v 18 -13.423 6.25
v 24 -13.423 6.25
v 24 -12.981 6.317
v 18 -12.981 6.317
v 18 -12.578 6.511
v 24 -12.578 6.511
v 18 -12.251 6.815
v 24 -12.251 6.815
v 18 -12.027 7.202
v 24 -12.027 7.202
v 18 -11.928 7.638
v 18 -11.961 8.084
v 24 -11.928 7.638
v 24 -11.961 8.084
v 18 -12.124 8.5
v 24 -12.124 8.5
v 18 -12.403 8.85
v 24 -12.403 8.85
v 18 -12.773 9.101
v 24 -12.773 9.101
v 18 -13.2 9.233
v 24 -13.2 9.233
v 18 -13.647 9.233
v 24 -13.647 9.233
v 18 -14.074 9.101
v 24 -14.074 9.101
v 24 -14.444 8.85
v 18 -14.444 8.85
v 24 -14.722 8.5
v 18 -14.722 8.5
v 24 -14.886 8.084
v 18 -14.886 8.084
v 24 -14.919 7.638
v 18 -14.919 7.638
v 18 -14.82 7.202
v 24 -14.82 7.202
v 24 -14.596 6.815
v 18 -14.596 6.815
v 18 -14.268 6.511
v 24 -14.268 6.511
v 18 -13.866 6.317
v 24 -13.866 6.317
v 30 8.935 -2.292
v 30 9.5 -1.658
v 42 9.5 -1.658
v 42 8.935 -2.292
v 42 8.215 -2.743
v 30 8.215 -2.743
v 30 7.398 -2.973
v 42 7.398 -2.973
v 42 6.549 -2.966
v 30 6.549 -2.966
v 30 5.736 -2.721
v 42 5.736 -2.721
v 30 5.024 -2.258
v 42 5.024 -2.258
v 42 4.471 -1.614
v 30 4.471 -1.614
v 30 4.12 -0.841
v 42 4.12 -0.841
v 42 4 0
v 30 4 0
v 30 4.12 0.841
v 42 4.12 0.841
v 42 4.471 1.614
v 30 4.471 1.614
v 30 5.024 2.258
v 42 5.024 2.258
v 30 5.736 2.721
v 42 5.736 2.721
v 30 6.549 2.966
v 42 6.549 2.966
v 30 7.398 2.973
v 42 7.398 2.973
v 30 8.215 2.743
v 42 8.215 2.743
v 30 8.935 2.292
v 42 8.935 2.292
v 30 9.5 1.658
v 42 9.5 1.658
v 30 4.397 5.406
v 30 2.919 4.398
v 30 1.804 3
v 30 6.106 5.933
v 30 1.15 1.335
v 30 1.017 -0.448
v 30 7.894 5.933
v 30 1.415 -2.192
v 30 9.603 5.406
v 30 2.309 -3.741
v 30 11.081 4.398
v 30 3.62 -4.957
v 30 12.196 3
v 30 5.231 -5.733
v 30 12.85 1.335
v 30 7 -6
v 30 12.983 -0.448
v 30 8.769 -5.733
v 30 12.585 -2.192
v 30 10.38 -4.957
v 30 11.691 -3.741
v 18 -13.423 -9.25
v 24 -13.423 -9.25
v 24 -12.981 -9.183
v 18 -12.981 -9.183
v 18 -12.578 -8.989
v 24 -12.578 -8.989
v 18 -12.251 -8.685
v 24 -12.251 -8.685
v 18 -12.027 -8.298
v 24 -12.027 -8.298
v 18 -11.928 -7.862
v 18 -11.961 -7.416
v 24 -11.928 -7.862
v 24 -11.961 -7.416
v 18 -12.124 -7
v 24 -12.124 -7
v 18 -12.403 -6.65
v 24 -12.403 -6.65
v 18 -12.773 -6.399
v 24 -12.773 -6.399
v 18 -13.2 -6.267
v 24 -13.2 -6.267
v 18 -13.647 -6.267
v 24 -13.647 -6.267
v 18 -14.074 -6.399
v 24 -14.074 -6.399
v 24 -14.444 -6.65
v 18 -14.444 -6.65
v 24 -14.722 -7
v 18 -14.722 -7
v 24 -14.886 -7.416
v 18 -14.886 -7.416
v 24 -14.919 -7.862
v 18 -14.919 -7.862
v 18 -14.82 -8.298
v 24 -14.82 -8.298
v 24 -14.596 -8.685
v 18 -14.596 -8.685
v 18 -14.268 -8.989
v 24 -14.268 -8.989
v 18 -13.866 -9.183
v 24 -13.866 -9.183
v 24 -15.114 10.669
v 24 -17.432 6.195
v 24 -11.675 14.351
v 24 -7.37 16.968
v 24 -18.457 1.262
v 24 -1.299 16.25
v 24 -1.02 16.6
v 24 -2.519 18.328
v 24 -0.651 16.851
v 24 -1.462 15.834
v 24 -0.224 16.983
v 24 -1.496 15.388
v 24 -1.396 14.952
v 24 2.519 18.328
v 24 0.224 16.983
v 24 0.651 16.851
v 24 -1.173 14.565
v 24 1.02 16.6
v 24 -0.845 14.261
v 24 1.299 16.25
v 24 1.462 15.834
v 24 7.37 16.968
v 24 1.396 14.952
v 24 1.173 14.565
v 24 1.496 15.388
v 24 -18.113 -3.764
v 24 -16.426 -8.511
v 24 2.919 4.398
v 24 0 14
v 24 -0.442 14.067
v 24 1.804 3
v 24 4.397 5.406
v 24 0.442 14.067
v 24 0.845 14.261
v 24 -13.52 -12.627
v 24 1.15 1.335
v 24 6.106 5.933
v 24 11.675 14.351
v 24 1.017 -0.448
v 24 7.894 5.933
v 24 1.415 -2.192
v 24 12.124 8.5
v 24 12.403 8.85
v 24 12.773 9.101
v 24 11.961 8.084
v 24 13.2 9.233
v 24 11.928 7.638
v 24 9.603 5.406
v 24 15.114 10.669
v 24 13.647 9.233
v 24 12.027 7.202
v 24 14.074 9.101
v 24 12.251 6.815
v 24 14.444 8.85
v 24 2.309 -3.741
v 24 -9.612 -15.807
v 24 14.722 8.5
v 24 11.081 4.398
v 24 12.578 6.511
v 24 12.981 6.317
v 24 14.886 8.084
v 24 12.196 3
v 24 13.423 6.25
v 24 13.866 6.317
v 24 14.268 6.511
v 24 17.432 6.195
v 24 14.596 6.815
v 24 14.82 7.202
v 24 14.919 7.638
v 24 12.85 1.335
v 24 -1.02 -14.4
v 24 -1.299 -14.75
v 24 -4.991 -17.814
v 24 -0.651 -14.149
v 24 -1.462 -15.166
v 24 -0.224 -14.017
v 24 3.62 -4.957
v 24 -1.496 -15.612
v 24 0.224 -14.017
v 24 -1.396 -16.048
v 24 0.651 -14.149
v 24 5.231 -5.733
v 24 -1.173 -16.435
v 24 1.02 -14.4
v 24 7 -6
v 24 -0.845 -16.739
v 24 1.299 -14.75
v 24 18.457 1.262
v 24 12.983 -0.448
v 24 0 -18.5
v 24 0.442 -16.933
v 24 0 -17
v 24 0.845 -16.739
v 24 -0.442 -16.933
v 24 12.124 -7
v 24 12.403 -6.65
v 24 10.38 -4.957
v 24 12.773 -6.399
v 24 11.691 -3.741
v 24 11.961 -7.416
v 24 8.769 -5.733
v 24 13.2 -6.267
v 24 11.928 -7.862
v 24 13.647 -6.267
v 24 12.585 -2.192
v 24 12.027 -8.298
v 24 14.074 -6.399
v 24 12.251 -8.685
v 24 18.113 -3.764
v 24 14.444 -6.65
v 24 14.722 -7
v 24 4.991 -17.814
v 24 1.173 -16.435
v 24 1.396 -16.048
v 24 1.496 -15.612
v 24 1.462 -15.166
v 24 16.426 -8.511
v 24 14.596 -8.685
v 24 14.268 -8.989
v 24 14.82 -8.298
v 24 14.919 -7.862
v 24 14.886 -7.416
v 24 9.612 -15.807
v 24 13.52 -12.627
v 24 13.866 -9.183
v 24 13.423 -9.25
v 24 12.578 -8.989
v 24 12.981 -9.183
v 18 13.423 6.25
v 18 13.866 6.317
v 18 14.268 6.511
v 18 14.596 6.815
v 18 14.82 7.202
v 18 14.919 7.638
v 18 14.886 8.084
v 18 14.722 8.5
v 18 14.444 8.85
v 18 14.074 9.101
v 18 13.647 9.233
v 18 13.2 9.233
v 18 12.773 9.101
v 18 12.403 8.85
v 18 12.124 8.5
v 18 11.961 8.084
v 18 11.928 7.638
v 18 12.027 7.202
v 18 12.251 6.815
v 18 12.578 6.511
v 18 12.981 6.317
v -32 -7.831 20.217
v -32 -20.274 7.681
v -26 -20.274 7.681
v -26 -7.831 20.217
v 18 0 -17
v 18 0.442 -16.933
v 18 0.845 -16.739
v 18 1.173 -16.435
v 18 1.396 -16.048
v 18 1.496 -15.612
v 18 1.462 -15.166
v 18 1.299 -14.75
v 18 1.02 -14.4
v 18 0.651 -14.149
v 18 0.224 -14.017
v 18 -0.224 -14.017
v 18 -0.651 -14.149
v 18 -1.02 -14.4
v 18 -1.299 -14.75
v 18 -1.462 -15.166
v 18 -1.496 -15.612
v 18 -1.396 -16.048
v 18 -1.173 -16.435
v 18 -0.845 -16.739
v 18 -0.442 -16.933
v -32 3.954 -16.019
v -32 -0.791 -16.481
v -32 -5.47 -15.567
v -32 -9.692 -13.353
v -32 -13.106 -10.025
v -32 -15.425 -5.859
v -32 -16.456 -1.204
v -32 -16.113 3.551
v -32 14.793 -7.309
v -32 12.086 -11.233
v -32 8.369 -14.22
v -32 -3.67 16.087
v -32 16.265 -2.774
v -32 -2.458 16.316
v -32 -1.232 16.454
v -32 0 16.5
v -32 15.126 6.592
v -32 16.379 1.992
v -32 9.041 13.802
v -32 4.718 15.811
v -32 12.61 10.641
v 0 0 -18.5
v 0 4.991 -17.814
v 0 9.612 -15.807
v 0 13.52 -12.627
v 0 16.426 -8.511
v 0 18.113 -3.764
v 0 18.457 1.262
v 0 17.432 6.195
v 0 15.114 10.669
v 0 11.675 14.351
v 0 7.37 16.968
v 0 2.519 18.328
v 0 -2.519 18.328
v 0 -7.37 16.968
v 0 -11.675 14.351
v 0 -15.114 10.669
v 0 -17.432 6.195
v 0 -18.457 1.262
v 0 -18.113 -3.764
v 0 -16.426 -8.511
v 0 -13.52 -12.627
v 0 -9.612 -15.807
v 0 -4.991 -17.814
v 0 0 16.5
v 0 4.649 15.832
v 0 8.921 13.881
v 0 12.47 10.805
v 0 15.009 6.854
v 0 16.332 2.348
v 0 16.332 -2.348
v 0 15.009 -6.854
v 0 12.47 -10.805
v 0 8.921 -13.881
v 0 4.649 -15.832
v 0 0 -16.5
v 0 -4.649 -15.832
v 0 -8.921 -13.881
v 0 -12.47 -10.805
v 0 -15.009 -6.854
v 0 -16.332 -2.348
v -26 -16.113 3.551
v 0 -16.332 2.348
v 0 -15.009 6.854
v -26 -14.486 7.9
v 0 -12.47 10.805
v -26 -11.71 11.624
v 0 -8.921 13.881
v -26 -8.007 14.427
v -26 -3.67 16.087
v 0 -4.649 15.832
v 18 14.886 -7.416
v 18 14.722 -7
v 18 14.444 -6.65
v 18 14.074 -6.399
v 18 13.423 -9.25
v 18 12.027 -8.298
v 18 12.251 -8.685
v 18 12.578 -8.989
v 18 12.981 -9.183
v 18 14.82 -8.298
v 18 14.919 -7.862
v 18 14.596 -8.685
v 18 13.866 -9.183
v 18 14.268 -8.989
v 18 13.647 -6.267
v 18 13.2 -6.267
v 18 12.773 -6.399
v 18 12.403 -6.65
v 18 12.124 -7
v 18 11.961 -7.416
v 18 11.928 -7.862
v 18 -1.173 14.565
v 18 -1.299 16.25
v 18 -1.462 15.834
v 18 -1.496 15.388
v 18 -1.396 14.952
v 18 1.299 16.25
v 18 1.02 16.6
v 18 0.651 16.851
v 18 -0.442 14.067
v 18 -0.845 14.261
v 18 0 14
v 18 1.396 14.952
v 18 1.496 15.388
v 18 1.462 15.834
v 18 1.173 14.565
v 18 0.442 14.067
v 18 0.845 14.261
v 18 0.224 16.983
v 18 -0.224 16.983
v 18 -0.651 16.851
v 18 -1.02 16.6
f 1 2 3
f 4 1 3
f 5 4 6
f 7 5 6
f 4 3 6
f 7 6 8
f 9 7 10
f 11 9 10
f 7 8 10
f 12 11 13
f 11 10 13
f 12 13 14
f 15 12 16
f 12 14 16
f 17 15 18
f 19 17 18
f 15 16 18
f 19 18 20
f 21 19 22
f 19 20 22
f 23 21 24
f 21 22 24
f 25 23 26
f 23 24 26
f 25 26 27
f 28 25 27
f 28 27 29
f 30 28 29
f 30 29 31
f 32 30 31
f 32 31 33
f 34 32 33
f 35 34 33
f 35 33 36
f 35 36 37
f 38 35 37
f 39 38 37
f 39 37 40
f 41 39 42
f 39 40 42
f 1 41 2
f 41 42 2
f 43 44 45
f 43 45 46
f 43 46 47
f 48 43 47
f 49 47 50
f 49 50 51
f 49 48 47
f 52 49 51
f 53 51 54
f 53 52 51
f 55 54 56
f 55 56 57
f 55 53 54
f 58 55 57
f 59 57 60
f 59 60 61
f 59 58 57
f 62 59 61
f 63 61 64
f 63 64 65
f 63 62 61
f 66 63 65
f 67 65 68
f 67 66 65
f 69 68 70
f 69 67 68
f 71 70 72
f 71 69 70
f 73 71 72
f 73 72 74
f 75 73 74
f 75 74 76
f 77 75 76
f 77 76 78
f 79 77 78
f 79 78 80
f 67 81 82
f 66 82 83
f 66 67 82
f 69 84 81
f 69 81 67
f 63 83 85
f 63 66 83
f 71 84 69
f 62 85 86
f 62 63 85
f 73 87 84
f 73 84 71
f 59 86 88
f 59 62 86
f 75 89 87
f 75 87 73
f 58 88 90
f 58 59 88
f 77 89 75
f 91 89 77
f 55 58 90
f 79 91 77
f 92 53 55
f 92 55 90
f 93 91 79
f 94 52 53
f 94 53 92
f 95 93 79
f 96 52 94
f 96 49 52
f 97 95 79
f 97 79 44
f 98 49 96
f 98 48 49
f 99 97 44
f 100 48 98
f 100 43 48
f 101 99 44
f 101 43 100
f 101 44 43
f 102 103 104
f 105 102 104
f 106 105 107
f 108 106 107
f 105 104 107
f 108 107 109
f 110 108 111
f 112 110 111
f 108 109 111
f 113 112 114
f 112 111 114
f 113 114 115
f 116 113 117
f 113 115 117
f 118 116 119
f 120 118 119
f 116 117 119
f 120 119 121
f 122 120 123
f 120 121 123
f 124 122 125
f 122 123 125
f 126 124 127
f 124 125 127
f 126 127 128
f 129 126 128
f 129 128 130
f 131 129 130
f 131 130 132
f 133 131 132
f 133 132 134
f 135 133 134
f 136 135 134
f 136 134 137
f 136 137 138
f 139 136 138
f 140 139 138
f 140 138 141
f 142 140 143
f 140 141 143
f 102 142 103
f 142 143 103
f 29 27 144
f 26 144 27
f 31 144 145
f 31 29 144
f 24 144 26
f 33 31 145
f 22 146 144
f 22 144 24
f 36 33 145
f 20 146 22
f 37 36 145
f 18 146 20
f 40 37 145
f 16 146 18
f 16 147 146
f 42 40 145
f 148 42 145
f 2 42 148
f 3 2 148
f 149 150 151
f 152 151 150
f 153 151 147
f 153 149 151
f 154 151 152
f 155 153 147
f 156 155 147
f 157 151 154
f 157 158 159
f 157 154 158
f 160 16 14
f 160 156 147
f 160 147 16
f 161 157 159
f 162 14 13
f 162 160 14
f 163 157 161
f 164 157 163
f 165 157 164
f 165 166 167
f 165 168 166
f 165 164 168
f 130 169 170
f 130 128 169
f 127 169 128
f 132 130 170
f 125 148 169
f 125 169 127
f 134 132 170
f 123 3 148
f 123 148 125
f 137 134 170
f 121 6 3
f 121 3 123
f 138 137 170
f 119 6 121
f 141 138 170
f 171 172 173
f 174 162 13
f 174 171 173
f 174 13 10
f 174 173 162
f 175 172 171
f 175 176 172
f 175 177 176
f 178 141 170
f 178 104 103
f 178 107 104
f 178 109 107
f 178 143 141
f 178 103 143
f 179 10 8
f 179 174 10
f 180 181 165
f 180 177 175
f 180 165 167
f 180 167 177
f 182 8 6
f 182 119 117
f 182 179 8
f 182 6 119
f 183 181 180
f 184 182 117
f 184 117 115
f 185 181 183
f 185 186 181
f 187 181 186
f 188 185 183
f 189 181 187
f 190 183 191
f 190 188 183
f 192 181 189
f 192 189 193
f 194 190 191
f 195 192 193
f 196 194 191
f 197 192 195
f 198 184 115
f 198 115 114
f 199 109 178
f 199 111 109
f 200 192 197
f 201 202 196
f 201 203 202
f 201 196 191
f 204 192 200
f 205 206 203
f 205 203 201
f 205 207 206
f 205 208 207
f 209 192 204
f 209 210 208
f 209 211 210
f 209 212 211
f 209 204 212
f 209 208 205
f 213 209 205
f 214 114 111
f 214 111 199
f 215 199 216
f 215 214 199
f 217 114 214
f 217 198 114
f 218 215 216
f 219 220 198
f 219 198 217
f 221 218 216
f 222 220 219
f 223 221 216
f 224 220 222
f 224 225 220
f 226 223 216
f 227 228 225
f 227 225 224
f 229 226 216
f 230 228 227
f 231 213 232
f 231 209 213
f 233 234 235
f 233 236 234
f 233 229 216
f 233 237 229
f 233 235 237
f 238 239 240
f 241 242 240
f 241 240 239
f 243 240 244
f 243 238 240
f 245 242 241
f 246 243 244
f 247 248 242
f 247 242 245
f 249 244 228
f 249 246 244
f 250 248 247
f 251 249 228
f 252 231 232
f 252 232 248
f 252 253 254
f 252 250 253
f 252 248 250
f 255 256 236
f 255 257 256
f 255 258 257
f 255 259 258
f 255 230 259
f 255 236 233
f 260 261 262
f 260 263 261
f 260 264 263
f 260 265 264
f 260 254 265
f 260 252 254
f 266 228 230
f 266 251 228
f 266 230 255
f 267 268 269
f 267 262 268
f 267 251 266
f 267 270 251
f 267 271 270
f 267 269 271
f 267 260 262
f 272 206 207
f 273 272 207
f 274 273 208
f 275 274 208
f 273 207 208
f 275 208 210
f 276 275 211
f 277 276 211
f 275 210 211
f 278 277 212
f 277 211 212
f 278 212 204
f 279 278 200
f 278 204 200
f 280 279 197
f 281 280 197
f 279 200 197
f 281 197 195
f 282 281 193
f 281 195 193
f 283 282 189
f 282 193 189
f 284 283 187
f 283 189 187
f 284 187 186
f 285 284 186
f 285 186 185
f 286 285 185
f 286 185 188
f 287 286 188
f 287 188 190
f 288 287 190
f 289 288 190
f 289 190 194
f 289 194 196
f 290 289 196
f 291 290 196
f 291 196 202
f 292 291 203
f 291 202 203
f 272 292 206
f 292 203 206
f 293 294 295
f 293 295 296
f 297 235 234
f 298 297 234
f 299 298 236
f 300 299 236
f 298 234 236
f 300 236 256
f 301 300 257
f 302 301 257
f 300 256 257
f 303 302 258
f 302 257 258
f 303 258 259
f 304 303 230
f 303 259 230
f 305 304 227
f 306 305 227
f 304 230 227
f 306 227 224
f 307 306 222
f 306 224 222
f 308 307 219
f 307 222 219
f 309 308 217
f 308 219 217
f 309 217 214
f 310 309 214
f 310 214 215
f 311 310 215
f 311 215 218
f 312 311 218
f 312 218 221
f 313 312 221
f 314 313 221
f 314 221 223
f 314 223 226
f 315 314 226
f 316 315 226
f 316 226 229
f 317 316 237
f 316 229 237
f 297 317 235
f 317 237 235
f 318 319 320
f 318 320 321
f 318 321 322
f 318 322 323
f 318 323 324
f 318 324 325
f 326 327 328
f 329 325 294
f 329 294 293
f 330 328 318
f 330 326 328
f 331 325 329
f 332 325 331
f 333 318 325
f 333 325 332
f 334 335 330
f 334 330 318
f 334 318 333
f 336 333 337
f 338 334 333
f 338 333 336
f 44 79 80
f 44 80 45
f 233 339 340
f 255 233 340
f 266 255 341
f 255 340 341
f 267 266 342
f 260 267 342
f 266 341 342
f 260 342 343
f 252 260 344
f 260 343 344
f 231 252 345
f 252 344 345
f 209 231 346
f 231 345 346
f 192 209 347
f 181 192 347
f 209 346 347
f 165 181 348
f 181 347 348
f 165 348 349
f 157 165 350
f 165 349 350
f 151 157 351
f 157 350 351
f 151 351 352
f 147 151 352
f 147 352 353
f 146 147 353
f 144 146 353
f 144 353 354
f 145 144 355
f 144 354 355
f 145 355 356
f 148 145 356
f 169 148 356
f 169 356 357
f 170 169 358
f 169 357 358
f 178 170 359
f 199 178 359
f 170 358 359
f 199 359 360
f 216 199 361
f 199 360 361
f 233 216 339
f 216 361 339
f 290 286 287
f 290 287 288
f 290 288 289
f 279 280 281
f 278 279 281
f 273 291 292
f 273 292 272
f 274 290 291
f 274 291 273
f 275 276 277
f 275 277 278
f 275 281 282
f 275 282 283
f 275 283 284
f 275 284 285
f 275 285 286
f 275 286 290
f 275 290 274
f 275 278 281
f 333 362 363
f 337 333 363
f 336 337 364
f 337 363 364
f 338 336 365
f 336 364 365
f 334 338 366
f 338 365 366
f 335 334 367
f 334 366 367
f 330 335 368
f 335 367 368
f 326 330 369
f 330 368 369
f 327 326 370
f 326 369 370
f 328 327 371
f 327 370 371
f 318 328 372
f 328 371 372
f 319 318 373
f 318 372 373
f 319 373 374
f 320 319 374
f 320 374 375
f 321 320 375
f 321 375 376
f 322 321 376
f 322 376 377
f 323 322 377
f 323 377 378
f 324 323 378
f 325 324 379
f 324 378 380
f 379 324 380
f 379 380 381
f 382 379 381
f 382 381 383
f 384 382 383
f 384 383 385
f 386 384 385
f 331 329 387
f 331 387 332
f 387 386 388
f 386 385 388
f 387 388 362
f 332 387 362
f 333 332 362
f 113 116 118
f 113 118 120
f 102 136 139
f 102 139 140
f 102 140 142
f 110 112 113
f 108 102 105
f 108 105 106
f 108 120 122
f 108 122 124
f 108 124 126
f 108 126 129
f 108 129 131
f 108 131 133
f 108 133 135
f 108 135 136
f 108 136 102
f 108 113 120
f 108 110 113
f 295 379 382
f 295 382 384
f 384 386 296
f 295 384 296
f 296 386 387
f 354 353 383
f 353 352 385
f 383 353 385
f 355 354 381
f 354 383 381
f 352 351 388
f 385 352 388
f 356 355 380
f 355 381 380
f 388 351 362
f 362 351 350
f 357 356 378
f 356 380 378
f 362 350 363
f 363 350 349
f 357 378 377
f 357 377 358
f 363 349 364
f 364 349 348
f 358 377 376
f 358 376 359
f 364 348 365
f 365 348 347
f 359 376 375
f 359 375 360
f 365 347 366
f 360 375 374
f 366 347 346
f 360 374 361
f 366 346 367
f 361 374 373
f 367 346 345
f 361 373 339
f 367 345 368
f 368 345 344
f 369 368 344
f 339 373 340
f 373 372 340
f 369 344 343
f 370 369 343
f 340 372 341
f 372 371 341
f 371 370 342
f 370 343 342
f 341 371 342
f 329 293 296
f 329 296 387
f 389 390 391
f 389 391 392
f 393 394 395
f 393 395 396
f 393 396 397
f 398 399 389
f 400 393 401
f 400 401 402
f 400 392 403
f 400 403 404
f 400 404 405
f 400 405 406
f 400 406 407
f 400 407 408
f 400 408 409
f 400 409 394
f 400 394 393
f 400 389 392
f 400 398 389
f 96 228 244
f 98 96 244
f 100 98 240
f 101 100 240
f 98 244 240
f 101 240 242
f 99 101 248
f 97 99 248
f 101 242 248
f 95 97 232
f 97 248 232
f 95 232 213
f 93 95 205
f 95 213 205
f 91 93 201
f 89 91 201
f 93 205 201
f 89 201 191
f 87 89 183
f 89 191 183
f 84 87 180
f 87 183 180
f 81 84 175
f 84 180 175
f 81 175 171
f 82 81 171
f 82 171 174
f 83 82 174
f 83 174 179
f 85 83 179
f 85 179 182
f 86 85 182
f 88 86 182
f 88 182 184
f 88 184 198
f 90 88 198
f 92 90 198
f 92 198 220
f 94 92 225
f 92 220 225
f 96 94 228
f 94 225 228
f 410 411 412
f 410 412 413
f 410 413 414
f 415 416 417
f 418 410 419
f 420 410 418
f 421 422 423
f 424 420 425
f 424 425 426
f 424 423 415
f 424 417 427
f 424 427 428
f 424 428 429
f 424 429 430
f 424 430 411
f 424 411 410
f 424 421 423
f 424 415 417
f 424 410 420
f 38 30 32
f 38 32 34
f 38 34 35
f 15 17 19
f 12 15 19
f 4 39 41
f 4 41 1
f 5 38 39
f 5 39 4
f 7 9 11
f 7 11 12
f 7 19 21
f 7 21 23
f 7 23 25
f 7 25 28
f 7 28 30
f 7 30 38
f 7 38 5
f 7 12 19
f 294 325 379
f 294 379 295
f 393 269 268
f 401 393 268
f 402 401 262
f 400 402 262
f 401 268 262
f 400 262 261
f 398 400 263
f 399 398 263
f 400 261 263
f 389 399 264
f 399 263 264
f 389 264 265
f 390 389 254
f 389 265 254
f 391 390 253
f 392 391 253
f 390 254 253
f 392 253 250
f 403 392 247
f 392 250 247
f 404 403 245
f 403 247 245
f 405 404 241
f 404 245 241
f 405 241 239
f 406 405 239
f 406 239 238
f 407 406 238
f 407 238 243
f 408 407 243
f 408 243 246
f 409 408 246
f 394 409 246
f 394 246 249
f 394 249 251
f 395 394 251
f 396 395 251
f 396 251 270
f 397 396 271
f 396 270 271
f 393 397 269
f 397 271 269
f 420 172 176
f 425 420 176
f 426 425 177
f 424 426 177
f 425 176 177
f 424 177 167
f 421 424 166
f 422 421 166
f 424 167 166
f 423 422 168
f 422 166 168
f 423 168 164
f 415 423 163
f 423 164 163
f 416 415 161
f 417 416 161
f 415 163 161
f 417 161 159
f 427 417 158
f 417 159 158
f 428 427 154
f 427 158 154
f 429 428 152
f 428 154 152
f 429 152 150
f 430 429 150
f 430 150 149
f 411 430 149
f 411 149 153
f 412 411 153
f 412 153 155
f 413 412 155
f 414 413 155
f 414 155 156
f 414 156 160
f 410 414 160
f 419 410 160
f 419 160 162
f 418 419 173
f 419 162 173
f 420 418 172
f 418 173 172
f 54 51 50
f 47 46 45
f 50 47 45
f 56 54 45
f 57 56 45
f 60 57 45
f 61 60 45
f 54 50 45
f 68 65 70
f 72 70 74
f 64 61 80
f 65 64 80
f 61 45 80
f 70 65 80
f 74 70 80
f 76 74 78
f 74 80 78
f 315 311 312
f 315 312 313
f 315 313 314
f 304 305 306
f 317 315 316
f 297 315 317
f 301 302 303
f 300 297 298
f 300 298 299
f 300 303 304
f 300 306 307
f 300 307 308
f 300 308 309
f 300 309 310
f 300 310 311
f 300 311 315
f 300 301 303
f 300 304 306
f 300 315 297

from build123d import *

# Parameters (mm, degrees)
SKETCH_1_R          = 18.5
EXTRUDE_1_DEPTH     = 24
SKETCH_2_R          = 16.5
EXTRUDE_2_DEPTH     = 32
SKETCH_4_R          = 1.5
CUT_EXTRUDE_1_DEPTH = 6
SKETCH_5_R          = 6
EXTRUDE_3_DEPTH     = 6
EXTRUDE_4_DEPTH     = 12
EXTRUDE_5_DEPTH     = 6


with BuildPart() as part:
    # 草图1 → 凸台-拉伸1 (new body)
    with BuildSketch(Plane(origin=(0, 0, 0), x_dir=(0, 0, -1), z_dir=(1, 0, 0))):
        Circle(SKETCH_1_R)
    extrude(amount=EXTRUDE_1_DEPTH)

    # 草图2 → 凸台-拉伸2 (add)
    with BuildSketch(Plane.ZY):
        Circle(SKETCH_2_R)
    extrude(amount=EXTRUDE_2_DEPTH)

    # 草图4 → 切除-拉伸1 (cut)
    with BuildSketch(Plane(origin=(24, 0, 0), x_dir=(0, 0, -1), z_dir=(1, 0, 0))):
        with Locations((15.5, 0)):
            Circle(SKETCH_4_R)
        with Locations((7.75, -13.423393759)):
            Circle(SKETCH_4_R)
        with Locations((-7.75, -13.423393759)):
            Circle(SKETCH_4_R)
        with Locations((-15.5, 0)):
            Circle(SKETCH_4_R)
        with Locations((-7.75, 13.423393759)):
            Circle(SKETCH_4_R)
        with Locations((7.75, 13.423393759)):
            Circle(SKETCH_4_R)
    extrude(amount=-CUT_EXTRUDE_1_DEPTH, mode=Mode.SUBTRACT)

    # 草图5 → 凸台-拉伸3 (add)
    with BuildSketch(Plane(origin=(24, 0, 0), x_dir=(0, 0, -1), z_dir=(1, 0, 0))):
        with Locations((0, 7)):
            Circle(SKETCH_5_R)
    extrude(amount=EXTRUDE_3_DEPTH)

    # 草图6 → 凸台-拉伸4 (add)
    with BuildSketch(Plane(origin=(30, 0, 0), x_dir=(0, 0, -1), z_dir=(1, 0, 0))):
        with BuildLine():
            Line((-1.658312395, 9.5), (1.658312395, 9.5))
            ThreePointArc((1.658312395, 9.5), (0, 4), (-1.658312395, 9.5))
        make_face()
    extrude(amount=EXTRUDE_4_DEPTH)

    # 草图7 → 凸台-拉伸5 (add)
    with BuildSketch(Plane.ZY.offset(32)):
        Polygon((7.680859807, -20.274157757), (20.216755747, -7.8307003), (16.086686091, -3.669949673), (3.550790151, -16.113407129), align=None)
    extrude(amount=-EXTRUDE_5_DEPTH)


solid = part.part
